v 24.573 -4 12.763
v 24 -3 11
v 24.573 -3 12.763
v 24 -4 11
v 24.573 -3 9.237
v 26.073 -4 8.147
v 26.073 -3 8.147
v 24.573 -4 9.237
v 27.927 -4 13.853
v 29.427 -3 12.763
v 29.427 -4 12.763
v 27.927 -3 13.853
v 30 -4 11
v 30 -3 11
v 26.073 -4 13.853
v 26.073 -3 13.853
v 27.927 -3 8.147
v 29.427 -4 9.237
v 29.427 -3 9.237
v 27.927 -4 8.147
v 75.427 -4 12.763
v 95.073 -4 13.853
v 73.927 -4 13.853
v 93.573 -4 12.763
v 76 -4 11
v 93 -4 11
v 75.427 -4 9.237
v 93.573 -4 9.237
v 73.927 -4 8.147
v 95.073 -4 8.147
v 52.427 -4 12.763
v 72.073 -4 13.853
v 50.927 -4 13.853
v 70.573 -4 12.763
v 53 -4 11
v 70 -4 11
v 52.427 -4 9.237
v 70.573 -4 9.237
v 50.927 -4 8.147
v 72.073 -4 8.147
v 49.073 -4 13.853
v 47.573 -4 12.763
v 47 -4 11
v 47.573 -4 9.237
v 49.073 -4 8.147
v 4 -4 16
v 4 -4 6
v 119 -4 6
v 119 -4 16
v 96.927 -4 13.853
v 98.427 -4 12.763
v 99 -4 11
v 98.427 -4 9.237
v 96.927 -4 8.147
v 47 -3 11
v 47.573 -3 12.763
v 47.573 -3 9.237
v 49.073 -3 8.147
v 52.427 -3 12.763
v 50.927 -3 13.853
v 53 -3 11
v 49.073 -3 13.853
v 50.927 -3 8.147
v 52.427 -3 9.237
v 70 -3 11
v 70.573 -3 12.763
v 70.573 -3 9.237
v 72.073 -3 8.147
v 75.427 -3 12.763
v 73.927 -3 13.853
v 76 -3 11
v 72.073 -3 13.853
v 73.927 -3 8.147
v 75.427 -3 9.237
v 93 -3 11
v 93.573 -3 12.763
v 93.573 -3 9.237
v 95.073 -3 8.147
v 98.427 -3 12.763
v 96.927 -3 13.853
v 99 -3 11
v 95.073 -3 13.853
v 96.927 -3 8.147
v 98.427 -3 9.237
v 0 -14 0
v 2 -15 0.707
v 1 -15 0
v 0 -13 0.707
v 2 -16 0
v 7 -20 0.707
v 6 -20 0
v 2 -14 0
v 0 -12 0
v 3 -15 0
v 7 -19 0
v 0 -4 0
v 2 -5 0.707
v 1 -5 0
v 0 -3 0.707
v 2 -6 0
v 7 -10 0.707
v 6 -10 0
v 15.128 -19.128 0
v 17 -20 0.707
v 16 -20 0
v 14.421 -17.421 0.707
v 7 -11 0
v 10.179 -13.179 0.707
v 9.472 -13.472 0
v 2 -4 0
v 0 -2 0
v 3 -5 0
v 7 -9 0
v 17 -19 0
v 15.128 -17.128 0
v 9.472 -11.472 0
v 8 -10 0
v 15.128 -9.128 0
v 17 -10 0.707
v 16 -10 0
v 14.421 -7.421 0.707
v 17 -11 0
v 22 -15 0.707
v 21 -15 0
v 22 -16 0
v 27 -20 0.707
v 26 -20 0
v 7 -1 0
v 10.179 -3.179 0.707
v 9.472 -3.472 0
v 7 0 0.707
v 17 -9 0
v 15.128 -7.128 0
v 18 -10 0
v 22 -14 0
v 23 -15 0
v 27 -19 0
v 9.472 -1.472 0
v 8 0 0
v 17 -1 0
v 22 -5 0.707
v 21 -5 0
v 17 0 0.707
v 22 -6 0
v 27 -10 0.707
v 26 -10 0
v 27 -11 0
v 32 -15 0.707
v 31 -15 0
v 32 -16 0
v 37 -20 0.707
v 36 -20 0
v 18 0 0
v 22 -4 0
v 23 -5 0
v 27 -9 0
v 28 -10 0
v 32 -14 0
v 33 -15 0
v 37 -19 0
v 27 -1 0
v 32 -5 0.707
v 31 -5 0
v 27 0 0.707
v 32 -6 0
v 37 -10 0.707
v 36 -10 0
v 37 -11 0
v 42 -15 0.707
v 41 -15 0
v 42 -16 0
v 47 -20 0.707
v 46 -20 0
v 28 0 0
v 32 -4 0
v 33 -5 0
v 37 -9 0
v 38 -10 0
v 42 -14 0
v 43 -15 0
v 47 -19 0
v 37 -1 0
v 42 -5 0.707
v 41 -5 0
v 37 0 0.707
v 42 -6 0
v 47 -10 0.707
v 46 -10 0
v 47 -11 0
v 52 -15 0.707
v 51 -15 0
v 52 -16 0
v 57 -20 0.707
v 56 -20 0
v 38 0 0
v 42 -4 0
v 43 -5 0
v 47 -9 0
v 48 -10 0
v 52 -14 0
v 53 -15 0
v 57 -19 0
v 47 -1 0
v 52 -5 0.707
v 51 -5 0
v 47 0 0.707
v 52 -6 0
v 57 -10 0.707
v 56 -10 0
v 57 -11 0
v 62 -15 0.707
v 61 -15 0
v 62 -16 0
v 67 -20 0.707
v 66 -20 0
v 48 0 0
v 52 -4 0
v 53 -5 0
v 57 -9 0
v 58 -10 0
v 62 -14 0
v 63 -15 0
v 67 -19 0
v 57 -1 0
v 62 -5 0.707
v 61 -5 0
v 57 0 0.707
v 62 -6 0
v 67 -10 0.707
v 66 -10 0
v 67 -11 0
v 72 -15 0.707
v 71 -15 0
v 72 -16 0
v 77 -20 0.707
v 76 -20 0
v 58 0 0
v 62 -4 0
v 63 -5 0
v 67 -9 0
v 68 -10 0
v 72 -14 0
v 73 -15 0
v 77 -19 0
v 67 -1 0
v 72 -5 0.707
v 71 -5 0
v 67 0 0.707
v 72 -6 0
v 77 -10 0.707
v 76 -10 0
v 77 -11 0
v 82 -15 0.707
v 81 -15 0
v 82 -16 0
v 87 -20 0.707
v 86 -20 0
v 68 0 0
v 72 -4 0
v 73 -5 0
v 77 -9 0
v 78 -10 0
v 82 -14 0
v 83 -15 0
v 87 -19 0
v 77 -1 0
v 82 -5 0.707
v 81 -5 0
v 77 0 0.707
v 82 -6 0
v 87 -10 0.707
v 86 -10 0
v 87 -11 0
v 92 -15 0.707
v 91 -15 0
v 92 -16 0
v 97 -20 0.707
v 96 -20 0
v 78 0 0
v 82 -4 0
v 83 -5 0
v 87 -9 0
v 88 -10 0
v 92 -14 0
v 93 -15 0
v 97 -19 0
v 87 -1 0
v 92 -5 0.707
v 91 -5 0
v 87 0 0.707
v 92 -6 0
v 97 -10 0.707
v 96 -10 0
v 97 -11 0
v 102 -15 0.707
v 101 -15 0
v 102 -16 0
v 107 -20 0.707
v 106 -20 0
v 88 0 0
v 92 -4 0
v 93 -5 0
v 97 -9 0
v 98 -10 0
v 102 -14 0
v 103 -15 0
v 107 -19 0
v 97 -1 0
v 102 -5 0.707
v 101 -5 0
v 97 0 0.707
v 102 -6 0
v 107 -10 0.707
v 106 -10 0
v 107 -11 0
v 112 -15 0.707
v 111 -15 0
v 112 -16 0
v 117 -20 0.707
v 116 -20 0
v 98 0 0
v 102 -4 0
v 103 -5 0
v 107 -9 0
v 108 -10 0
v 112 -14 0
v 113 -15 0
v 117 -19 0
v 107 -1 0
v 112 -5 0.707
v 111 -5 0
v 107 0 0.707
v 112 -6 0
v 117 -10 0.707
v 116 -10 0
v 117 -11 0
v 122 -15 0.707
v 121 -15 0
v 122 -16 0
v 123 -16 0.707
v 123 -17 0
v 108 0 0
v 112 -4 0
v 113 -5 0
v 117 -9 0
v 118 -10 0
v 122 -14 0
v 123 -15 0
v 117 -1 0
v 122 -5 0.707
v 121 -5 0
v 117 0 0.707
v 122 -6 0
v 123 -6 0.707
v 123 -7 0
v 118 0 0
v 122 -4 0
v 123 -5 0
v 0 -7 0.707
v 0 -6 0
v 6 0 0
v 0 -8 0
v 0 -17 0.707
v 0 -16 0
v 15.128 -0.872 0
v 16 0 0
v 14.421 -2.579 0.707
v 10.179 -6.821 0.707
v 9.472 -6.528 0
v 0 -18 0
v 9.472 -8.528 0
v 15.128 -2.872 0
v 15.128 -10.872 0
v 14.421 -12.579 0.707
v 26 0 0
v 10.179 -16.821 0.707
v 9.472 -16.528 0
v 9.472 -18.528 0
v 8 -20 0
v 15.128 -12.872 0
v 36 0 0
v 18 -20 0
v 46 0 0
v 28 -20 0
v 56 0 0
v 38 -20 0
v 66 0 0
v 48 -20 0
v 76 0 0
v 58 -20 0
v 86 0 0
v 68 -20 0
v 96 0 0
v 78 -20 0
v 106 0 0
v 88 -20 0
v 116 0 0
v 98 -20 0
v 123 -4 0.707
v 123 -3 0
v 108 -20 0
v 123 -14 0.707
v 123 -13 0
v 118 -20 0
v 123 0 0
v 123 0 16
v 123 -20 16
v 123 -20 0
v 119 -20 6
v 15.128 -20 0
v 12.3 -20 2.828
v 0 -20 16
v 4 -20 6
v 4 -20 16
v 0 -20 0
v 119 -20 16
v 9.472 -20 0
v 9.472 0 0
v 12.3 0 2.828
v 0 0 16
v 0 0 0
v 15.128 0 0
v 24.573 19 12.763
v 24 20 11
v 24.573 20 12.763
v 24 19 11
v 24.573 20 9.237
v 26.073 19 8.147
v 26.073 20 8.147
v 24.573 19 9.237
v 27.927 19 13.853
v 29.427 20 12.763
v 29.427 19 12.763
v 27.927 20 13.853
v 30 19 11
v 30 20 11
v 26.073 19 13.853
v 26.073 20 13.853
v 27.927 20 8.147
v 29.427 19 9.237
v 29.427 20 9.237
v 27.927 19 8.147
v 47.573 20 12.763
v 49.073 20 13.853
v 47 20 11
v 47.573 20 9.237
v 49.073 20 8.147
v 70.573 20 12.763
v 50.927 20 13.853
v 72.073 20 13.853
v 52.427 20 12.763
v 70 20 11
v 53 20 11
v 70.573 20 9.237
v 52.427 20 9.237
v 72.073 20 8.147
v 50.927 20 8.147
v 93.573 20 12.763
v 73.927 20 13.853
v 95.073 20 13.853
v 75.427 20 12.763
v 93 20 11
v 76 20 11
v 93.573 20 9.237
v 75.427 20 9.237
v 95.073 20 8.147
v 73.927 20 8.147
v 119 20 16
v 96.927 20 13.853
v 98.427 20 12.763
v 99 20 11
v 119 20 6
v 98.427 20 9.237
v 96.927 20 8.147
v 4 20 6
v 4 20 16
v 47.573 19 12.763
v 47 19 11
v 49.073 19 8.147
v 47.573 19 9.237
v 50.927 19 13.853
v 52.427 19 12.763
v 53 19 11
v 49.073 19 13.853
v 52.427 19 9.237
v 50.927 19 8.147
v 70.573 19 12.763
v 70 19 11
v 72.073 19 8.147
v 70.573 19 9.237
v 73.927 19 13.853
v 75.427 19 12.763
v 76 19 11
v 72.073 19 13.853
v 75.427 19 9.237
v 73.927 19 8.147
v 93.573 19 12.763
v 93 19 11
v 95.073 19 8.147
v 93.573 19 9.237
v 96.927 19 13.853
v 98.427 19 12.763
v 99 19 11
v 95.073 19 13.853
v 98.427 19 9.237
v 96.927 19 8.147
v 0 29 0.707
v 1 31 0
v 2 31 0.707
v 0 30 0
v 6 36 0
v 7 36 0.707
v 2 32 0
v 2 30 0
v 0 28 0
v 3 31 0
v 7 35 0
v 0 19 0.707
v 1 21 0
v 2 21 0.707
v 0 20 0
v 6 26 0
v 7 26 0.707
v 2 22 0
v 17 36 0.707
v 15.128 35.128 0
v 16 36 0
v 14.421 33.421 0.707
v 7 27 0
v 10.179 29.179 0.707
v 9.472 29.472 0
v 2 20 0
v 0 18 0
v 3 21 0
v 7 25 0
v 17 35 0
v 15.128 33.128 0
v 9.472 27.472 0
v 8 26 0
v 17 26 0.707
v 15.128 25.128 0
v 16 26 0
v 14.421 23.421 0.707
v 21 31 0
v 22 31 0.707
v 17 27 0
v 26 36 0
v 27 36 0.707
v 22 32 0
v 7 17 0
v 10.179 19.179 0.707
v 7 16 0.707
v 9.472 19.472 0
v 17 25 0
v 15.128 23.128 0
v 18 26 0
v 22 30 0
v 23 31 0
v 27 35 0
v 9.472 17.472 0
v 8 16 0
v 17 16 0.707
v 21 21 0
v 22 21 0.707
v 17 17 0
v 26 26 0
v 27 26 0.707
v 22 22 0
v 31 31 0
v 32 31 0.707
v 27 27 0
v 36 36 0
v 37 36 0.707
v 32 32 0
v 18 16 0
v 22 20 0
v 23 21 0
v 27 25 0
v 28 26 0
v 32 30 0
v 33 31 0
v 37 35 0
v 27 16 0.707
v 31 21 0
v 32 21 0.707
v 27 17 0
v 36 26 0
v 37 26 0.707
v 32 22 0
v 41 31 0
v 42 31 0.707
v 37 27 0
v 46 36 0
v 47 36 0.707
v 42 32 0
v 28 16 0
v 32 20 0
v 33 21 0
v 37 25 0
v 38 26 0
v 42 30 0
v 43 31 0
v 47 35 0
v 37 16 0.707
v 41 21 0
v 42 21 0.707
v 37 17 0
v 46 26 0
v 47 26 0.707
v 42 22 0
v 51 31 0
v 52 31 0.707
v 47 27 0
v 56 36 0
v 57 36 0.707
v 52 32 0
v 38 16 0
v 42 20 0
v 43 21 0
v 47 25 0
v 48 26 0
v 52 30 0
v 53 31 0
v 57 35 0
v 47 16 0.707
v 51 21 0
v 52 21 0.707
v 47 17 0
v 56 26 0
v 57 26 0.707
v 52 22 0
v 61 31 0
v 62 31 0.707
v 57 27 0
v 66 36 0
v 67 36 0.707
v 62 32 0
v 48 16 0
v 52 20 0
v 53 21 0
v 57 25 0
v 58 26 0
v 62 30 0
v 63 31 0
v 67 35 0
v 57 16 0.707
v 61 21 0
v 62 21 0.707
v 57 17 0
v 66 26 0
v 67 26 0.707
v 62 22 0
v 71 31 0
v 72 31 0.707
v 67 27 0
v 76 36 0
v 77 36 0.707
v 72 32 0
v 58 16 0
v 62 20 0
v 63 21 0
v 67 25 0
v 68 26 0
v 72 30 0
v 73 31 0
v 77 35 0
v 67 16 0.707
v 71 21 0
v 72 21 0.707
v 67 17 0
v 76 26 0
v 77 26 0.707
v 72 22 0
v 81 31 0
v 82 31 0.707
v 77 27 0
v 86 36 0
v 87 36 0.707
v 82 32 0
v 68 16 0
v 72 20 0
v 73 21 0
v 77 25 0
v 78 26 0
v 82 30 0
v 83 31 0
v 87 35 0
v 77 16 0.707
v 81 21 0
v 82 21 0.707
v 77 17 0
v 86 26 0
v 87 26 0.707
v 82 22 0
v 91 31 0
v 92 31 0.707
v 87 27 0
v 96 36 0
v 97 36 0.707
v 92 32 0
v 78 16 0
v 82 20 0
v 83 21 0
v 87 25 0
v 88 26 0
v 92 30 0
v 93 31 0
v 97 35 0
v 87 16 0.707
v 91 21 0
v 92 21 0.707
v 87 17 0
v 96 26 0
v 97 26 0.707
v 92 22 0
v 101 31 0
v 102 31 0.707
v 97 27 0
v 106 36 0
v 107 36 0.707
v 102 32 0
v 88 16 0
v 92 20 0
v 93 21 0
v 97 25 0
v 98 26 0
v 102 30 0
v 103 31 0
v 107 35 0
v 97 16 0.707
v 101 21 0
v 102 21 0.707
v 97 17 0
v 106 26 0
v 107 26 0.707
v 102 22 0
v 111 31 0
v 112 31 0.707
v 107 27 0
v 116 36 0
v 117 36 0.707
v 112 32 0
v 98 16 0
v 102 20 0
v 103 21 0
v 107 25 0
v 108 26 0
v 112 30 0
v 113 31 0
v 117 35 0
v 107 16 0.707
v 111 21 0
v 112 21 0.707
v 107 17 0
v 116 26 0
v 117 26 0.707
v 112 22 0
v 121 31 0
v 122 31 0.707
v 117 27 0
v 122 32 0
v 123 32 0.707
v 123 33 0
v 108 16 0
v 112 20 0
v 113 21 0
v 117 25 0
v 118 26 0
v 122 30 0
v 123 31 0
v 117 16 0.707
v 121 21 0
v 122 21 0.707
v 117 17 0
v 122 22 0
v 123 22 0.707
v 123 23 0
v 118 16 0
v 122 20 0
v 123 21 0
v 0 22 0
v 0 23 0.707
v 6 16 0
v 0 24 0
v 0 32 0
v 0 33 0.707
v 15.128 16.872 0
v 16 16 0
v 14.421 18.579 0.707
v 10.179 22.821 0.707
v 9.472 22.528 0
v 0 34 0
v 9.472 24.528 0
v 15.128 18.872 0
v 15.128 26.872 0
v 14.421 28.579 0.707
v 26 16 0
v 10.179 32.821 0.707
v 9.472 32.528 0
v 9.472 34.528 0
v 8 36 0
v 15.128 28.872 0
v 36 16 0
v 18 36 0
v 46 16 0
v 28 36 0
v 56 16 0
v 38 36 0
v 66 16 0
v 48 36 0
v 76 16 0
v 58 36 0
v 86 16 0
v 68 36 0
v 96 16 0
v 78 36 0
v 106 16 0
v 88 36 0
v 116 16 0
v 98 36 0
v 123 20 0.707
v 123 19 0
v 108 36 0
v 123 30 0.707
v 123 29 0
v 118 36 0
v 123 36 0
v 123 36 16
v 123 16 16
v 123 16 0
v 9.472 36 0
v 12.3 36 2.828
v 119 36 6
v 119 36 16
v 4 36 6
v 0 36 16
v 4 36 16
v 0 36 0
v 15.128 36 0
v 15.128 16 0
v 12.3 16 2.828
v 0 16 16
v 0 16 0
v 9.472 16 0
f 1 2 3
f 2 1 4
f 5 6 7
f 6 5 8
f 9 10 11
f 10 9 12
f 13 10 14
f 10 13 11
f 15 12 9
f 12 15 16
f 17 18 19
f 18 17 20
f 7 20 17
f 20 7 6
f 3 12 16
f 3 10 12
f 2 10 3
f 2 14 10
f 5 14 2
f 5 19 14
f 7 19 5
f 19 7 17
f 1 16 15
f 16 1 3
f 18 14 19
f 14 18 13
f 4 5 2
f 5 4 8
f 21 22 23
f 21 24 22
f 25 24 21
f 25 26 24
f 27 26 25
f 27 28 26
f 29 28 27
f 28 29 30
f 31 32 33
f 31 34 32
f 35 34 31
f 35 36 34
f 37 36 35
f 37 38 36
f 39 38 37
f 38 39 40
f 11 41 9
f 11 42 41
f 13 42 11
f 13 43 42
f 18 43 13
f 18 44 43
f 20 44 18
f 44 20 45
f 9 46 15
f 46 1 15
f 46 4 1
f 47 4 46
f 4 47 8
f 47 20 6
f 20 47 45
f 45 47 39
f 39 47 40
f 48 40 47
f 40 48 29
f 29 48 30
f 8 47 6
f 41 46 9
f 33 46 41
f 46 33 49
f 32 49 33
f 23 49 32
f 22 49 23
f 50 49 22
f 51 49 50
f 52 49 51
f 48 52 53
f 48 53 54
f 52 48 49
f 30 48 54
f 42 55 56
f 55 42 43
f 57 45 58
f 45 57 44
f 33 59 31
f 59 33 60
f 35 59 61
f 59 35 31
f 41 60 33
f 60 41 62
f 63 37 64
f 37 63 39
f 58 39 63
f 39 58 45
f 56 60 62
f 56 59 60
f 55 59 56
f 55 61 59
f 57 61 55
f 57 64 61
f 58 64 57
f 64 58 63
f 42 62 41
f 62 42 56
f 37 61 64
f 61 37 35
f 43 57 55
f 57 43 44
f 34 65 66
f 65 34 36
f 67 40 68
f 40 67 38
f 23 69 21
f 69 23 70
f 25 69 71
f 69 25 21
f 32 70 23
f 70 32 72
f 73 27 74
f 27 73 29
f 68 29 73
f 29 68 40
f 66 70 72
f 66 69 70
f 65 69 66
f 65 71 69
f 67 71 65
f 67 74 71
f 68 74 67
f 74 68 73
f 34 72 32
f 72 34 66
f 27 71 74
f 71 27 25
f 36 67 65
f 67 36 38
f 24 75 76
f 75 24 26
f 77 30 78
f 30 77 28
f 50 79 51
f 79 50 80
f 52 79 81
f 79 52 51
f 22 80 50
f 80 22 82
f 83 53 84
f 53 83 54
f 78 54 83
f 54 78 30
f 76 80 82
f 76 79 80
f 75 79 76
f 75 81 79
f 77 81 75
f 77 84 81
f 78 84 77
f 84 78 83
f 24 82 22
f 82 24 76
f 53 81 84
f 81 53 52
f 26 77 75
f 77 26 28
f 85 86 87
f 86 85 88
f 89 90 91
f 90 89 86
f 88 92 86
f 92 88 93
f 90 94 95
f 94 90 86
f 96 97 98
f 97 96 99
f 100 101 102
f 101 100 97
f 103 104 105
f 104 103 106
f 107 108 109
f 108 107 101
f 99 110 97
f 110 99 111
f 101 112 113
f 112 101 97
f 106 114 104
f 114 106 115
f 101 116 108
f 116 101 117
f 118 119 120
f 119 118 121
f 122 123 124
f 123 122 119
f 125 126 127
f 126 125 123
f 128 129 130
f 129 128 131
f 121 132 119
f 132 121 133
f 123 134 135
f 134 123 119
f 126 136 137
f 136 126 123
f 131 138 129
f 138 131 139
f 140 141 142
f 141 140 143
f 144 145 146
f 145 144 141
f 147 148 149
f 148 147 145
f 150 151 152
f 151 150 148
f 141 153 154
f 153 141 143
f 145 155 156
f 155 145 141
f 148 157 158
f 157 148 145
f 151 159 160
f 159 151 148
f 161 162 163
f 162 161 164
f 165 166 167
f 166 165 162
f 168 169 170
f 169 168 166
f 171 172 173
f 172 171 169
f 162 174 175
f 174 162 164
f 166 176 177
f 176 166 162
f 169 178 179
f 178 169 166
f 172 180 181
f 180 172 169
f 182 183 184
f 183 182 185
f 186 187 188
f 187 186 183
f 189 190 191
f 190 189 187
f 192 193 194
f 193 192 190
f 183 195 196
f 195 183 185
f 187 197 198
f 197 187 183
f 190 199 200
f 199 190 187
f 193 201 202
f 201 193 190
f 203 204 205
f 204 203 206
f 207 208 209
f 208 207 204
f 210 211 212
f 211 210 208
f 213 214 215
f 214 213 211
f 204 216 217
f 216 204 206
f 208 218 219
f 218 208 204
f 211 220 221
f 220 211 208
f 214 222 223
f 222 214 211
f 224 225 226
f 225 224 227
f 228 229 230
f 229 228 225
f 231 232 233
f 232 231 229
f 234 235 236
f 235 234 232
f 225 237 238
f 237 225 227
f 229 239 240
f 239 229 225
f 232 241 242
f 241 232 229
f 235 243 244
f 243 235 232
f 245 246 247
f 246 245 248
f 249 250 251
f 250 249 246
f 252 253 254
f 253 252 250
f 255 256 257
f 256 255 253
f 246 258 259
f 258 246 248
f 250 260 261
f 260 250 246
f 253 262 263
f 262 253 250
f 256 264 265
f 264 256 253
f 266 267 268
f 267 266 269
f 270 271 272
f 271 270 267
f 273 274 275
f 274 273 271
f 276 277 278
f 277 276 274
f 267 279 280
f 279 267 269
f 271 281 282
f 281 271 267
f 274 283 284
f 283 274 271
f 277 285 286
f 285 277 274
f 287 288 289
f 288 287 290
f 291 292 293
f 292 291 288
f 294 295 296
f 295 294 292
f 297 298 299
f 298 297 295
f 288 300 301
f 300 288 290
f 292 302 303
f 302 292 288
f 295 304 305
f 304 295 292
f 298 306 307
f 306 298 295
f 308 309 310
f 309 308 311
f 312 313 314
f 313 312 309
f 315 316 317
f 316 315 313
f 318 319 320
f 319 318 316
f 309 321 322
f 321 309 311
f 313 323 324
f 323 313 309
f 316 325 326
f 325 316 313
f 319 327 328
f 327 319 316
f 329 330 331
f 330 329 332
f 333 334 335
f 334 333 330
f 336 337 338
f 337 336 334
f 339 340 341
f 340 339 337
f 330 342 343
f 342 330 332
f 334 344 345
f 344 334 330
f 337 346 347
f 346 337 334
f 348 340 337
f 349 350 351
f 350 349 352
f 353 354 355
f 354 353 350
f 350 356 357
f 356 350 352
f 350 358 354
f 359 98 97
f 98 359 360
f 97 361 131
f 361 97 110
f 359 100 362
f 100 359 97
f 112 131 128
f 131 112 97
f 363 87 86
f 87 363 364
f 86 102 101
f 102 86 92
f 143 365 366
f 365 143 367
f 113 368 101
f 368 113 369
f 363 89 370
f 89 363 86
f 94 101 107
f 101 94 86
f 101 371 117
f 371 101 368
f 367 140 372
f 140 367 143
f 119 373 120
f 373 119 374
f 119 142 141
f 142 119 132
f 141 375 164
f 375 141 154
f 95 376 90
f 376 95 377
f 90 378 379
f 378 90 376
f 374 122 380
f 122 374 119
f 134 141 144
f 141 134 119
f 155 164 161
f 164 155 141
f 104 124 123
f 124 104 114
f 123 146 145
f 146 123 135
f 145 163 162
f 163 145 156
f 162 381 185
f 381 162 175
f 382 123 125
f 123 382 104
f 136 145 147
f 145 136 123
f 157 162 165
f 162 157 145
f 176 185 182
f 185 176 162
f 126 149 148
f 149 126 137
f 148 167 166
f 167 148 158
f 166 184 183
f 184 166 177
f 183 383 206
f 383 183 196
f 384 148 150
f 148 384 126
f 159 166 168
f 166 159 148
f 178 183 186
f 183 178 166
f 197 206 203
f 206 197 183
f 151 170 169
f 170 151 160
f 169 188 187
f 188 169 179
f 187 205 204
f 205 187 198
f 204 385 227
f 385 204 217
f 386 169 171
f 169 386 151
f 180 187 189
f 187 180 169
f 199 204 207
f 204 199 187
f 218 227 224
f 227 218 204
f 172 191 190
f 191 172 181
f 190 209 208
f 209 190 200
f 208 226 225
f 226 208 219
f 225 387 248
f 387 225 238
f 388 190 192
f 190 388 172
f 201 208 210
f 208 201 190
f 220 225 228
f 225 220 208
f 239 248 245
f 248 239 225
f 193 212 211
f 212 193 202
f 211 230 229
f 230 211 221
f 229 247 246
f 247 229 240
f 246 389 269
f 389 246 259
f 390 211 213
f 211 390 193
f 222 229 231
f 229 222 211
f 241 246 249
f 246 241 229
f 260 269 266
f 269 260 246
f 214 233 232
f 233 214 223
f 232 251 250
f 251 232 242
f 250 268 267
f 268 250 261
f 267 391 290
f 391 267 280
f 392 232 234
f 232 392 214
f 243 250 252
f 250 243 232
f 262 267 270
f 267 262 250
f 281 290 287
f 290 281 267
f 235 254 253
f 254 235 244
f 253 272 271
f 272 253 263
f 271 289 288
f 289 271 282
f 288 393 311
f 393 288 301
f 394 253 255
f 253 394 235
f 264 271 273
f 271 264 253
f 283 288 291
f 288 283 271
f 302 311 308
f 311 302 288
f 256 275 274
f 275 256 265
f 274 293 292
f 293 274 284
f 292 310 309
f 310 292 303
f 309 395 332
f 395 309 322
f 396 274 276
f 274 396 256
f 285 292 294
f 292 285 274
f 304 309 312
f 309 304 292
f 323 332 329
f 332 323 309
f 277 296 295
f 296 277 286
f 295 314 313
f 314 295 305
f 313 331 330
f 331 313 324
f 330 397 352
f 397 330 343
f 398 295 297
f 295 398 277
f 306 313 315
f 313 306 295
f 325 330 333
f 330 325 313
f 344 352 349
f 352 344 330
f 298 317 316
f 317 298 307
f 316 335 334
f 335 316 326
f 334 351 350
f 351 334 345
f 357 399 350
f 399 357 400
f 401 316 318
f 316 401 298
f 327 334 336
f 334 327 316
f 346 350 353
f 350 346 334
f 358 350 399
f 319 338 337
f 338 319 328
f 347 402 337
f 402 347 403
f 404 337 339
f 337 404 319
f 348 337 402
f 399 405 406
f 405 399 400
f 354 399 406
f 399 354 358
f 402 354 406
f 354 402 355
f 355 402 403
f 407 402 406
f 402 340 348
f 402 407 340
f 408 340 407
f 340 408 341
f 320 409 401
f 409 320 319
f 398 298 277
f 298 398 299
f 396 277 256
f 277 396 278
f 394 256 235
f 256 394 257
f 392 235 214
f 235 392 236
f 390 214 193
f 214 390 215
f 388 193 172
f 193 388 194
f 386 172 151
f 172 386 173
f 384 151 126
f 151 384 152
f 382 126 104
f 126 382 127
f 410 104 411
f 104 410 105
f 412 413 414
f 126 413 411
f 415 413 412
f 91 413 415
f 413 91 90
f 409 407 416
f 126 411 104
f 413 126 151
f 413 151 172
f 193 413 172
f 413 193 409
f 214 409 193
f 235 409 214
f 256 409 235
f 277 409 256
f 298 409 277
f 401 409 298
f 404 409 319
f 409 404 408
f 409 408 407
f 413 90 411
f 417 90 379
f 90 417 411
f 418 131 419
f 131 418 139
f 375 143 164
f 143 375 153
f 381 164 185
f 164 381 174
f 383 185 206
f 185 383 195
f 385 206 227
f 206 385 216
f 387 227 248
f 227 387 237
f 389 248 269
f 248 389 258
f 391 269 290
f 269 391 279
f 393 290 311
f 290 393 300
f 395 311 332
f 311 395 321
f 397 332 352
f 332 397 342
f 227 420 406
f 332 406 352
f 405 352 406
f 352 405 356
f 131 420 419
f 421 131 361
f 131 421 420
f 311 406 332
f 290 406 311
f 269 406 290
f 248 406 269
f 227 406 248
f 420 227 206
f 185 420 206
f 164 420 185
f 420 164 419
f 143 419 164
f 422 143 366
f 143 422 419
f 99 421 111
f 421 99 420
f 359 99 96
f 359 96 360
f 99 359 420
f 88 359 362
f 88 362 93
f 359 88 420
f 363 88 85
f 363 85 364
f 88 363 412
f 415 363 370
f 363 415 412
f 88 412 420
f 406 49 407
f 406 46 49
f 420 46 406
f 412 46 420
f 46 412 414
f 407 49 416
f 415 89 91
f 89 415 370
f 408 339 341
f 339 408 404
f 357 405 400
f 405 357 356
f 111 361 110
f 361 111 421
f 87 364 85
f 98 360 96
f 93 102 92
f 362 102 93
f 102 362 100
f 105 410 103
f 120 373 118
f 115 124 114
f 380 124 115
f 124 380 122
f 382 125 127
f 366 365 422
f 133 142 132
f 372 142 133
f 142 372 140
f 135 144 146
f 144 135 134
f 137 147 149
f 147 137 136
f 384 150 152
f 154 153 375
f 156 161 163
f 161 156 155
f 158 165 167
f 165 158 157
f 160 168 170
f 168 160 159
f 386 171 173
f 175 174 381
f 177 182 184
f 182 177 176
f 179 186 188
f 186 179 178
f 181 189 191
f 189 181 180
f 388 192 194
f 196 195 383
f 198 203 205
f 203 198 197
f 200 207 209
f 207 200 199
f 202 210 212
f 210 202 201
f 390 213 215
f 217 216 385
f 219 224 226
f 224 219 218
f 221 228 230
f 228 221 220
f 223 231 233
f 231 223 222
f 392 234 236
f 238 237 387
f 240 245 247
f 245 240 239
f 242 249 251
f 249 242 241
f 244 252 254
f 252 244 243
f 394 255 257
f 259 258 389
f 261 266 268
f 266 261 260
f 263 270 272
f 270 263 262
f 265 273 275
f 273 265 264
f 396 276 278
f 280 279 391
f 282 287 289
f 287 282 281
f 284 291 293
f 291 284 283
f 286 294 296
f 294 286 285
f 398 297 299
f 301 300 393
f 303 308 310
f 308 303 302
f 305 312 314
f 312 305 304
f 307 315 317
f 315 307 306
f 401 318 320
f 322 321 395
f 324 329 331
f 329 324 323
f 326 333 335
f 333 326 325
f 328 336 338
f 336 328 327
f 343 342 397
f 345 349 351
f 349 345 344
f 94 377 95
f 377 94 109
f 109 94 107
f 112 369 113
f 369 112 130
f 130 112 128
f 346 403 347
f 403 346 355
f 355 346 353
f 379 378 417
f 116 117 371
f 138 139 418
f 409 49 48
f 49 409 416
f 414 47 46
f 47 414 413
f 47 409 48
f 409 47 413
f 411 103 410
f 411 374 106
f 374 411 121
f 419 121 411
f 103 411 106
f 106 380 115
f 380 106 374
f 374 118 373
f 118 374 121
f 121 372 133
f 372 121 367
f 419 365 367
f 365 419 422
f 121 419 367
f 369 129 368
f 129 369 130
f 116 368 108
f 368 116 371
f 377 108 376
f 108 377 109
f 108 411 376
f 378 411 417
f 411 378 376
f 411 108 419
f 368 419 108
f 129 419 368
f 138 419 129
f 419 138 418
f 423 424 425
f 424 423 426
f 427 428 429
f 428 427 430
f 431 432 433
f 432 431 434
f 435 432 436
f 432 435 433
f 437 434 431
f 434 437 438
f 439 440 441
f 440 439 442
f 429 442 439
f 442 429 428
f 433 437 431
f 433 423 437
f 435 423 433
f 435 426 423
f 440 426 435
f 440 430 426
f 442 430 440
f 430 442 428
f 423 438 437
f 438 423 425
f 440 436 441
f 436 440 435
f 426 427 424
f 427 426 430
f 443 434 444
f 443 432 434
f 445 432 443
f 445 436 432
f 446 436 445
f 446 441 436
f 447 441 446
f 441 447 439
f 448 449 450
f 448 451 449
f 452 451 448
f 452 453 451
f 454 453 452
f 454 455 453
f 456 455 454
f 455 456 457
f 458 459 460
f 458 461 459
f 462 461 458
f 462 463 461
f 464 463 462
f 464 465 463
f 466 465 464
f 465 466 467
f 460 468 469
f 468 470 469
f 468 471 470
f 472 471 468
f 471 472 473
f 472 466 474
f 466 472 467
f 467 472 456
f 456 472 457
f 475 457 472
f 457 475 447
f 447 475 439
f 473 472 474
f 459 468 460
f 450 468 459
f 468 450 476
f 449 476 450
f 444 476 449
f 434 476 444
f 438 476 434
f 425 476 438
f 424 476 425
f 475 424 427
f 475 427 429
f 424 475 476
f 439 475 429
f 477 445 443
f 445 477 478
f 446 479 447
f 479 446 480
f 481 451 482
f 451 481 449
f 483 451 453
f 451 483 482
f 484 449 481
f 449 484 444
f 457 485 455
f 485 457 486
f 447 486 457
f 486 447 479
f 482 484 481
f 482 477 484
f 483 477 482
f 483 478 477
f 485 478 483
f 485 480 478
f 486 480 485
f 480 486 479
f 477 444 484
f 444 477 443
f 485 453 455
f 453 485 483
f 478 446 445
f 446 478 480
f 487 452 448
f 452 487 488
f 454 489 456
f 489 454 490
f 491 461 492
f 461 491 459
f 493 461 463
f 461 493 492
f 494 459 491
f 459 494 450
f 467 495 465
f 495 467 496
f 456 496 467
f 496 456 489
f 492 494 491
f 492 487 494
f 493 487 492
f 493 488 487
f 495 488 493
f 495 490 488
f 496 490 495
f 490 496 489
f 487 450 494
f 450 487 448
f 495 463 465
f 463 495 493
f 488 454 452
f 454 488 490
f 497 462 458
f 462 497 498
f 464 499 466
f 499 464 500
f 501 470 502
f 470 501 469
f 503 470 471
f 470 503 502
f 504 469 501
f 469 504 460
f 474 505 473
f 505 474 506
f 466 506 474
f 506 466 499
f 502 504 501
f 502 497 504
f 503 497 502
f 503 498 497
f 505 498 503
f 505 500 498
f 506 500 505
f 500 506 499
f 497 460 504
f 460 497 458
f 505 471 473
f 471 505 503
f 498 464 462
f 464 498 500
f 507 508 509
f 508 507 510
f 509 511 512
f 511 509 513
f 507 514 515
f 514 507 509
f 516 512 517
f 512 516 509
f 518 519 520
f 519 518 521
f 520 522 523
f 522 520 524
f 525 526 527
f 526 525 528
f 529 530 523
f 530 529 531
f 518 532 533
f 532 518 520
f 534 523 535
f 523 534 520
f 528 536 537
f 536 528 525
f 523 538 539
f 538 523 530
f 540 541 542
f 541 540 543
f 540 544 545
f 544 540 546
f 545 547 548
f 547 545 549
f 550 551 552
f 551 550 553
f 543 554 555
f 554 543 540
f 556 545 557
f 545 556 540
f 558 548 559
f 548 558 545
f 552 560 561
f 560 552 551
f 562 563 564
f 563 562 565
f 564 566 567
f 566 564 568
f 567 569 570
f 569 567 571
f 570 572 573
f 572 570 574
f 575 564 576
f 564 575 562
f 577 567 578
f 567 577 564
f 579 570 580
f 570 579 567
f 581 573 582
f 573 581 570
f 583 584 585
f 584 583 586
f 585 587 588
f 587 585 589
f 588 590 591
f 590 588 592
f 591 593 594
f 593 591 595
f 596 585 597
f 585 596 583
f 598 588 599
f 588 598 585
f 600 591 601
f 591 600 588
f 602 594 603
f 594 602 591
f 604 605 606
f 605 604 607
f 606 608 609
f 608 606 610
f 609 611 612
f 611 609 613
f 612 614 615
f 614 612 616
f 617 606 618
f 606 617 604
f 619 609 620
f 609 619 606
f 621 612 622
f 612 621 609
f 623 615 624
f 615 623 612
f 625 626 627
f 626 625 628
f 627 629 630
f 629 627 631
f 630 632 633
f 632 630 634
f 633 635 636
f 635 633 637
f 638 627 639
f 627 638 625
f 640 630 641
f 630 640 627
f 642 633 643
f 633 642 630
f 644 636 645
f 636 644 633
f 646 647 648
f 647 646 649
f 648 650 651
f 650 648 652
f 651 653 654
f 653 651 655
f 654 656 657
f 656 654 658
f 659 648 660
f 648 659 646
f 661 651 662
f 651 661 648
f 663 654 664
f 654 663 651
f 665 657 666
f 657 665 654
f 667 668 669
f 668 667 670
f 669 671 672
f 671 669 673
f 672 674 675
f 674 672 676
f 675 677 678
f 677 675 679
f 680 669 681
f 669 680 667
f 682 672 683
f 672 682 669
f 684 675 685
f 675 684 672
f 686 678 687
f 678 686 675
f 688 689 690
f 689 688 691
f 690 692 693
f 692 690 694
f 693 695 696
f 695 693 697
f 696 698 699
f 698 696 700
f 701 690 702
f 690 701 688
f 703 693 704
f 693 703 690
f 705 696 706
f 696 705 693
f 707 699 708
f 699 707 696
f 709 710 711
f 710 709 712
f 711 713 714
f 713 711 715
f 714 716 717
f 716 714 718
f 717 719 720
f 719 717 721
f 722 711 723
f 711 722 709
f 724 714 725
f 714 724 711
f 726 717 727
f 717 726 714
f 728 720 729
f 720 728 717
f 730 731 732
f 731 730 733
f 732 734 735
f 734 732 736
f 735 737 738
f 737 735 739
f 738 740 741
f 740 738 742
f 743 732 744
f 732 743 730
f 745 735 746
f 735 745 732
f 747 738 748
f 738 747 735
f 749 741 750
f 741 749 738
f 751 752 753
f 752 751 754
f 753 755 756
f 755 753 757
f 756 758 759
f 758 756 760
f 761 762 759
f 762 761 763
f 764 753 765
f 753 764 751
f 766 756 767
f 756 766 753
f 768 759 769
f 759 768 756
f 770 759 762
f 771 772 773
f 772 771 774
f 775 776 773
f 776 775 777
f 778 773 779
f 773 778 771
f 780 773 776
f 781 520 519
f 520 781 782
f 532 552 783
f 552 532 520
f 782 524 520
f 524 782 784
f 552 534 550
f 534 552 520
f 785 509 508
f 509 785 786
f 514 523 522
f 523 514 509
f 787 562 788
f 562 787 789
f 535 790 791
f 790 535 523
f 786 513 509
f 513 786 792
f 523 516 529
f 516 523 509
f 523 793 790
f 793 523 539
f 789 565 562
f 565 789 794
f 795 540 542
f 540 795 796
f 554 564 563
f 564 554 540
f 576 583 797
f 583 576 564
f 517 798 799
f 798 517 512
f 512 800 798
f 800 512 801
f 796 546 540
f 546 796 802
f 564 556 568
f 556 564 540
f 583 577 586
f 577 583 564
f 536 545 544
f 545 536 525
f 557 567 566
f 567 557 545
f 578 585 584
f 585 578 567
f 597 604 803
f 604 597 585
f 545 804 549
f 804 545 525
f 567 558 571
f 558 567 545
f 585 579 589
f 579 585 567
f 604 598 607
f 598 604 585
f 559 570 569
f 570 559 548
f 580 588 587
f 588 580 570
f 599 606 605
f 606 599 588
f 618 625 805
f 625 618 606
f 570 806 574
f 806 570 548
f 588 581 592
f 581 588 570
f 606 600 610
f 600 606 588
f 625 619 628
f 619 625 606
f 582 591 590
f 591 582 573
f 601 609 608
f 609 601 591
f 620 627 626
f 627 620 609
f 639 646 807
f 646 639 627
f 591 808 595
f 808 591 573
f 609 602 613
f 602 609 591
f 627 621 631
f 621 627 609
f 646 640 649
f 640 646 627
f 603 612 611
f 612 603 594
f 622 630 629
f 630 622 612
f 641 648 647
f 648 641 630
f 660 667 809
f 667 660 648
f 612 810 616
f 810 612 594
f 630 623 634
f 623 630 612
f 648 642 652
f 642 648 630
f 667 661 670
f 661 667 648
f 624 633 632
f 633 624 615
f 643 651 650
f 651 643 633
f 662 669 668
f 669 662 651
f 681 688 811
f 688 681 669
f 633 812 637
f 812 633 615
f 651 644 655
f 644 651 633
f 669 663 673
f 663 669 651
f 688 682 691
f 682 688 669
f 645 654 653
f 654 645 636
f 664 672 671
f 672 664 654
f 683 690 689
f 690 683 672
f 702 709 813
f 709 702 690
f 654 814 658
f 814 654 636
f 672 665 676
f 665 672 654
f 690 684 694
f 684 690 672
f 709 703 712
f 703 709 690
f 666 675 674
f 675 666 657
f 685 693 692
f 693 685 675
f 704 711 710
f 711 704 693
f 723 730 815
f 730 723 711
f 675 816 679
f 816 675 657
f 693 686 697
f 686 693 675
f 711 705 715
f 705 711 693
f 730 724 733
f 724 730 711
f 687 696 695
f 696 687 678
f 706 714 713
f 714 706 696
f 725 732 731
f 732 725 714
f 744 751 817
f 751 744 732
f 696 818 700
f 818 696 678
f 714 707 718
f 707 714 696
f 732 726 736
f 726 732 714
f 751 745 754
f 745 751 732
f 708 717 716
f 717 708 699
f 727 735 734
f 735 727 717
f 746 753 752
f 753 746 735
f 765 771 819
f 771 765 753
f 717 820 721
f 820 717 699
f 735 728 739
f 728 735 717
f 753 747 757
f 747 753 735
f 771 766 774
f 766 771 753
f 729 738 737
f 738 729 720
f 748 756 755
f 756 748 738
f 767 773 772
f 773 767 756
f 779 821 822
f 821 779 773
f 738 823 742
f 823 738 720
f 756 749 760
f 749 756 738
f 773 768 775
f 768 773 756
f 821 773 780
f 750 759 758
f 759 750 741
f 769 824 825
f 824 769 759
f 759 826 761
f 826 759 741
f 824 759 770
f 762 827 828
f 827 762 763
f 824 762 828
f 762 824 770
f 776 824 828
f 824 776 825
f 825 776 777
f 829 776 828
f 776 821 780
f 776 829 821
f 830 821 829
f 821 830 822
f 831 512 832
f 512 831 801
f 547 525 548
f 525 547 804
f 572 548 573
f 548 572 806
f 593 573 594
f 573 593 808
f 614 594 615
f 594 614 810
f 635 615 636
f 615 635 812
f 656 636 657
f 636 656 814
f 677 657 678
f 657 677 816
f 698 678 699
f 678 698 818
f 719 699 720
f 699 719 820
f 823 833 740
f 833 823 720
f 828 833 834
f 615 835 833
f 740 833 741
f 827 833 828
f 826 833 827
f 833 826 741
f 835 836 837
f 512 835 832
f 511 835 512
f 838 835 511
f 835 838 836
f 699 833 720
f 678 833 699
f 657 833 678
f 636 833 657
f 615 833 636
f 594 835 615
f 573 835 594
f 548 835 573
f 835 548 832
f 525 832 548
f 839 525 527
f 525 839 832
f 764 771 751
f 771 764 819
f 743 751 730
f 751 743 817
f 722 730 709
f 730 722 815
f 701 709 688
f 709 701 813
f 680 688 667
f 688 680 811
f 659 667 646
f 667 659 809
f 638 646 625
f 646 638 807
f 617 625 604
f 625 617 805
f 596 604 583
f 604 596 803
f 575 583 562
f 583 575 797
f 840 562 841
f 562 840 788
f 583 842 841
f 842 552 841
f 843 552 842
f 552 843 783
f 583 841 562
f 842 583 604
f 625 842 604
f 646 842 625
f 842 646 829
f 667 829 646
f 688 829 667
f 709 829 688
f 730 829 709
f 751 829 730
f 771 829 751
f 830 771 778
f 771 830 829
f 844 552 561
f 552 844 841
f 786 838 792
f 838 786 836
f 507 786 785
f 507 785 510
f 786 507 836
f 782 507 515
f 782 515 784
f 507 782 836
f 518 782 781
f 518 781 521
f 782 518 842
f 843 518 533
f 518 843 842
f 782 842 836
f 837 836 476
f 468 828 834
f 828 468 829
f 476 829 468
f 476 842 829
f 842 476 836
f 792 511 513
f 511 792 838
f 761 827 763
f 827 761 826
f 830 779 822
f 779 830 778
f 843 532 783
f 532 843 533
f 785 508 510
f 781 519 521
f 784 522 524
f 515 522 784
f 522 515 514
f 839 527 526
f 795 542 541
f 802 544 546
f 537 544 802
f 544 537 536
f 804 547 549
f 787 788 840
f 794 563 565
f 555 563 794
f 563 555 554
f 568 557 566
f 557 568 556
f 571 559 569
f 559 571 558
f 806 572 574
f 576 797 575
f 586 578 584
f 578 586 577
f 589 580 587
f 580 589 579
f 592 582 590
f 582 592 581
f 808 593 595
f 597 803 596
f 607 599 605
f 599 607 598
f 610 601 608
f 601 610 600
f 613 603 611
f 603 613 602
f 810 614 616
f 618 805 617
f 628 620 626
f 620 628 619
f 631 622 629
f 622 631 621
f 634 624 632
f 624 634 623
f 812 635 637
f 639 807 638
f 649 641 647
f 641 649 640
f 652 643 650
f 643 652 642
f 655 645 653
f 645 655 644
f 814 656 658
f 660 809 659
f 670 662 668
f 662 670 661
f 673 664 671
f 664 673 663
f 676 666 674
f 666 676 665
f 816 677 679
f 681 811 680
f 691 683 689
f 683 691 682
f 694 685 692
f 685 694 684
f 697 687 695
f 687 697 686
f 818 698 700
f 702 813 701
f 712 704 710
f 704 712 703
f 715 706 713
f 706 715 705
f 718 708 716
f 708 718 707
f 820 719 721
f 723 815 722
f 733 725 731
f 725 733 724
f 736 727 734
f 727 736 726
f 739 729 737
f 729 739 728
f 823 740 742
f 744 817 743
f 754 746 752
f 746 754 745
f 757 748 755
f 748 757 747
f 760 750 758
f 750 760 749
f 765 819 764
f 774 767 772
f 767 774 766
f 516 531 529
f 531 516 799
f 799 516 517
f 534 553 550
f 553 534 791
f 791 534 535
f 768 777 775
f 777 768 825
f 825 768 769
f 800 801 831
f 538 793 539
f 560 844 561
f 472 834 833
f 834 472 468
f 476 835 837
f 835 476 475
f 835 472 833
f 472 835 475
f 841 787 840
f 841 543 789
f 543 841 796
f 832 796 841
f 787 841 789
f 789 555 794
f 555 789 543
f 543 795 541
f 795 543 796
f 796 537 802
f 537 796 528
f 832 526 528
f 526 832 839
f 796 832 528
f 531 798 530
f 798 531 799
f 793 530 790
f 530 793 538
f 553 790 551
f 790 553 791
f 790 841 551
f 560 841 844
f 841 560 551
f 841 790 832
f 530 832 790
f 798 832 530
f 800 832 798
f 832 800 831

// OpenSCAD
// The *interior* length of the jaw covers in mm.  This should be the size of your vise.  The walls will be added to this size.
interiorLength = 115;

// The width of the jaw covers as measured from the front of the face - this goes over the top of the vise and includes the jaw thickness.
totalWidth = 16;

// The height of the jaws as measured from the bottom of the jaw to the top
totalHeight = 20;

// The thickness of the gripping portion of the jaws.  Subtracted from the total width to determine how much goes over the top of the vise
jawThickness = 6;

// The thickness of all other walls aside from the jaws
wallThickness = 4;

// Number of magnets to put in the top of the jaws.  These will be equalled distributed across the length
numberOfMagnets = 4;

// Size of the magnets in mm.  If the magnets are square this will be the sides of the cube, otherwise this will be the diameter of the circle
magnetSize = 6;

// Height of the magnets in mm.  Make sure that your wall thickness is greater than this value
magnetDepth = 1;

// Set to 1 for square magnets or 0 for round magnets
squareMagnets = 0;

// Jaw face spacing between grip lines
gripSpacing = 10;

// Angle of the grip lines.  Values over 75 don't work so well.
gripAngle = 45;

// Number of round stock holder grooves.  If this is set to one, then the round stock holder position below is where it'll be placed.   
roundStockHolderCount = 1;

// Round stock holder groove.  Make sure the jaw thickness is enough that this won't go through the face
roundStockHolderGrooveSize = 4;

// Position of the stock holder groove as a percentage of the face - 0 to 100.  Keep in mind that 0 and 100 are going to be off the ends.  I recommend 10 and 90 as end stops but I'm not going to stand in your way.  If you specify multiple round stock holders the first will be placed here and all others will be placed based on this one.
roundStockHolderPosition = 10;

// Whether or not the round stock holder is horizontal or vertical.  Set to 0 for vertical and 1 for horizontal
roundStockHolderHorizontal = 0;

// Scaling value for the round stock holder.  Use this to make it wider without making it deeper - i.e. change the angle of the holder.  At 1 it creates a 45 degree angle. Values less than one make smaller angles and values greater than one make larger angles.  Setting this to zero effectively removes the round stock holder
roundStockHolderWidthScale = 1;

// How far apart to place the round stock holders.  This only takes effect if you have multiple round stock holders.  The first one will be placed at the initial position and all others will be placed this far away from it.  This distance should be greater than the round stock holder groove size * the round stock holder width scale.  If not, they're going to overlap.
gapBetweenRoundStockHolders = 30;

// The angle to face the jaws.  Set to 90 to face them down, 0 to face out, 180 to face in, 270 to face up, or 45 if you're feeling particularly adventurous
printingAngle = 90;

// Whether or not to print two jaws.  Set to 1 to get two jaws and 0 (or anything else really) to get a single jaw
printTwoJaws = 1;

// Create the first jaw
rotate ([printingAngle,0,0])
{
    CreateJaw();
}

// Create the second jaw if requested
if (printTwoJaws == 1)
{
    // The translation amount depends heavily on the angle.  Without this they end up
    // a long way apart or overlapping
    if (printingAngle < 45)
    {
        CreateSecondJaw(-3);
    }
    else if (printingAngle < 90)
    {
        CreateSecondJaw(-2);
    }
    else if (printingAngle < 200)
    {
        CreateSecondJaw(-1);
    }
    else
    {
        CreateSecondJaw(1);
    }
}

module CreateSecondJaw(translationSize)
{
    mirror([0,1,0])
    {
        // Move over a little and create a second jaw
        translate([0,totalWidth * translationSize,0])
        {
            rotate ([printingAngle,0,0])
            {
                CreateJaw();
            }
        }
    }
}

module CreateJaw()
{
    difference()
    {
        // The full jaw size
        cube([AddWalls(interiorLength, 2), totalWidth, totalHeight], false);

        // Subtract the "interior" of the jaws
        translate([wallThickness, jawThickness, wallThickness])
        {
            cube([interiorLength, SubtractJawWidth(totalWidth), AddWalls(totalHeight, -1)], false);
        }
        
        if (numberOfMagnets > 0)
        {
            // Subtract holes for the magnets
            translate([wallThickness, AddJawWidth(totalWidth)/2, wallThickness - magnetDepth])
            {
                CreateMagnetHoles(numberOfMagnets, interiorLength, magnetSize, magnetDepth, squareMagnets);
            }
        }
        
        // Subtract lines for the face "grip" pattern
        CreateGrip(gripSpacing, AddWalls(interiorLength, 2), totalHeight, gripAngle);

        for(moveCount = [1:roundStockHolderCount])
        {
            roundStockHolderCurrentOffset = gapBetweenRoundStockHolders * (moveCount - 1);
            // Create round stock groove
            if (roundStockHolderHorizontal == 0)
            {
                translate([(AddWalls(interiorLength, 2) * (roundStockHolderPosition / 100)) + roundStockHolderCurrentOffset, 0, 0])
                {
                    CreateRoundStockHolderGroove(roundStockHolderGrooveSize, roundStockHolderHorizontal, totalHeight);
                }
            }
            else
            {
                translate([0, 0, (totalHeight * (roundStockHolderPosition / 100)) + roundStockHolderCurrentOffset])
                {
                    rotate([0,90,0])
                    {
                        CreateRoundStockHolderGroove(roundStockHolderGrooveSize, roundStockHolderHorizontal, AddWalls(interiorLength, 2));
                    }
                }
            }
            
        }
    }
}

function AddWalls(length, numberWalls) = length + (wallThickness * numberWalls);

function AddJawWidth(length) = length + jawThickness;

function SubtractJawWidth(length) = length - jawThickness;

module CreateMagnetHoles(magnetCount, length, size, depth, magnetType)
{
    movementSize = length / (magnetCount + 1);
    for(moveCount = [1:magnetCount])
    {
        // Cubes are created at the corner of the existing location where
        // cylinders are not.  So for magnet type 1 (cube) we need to move 
        // by half the magnet size to get back to the right spot.  For round
        // magnets we multiply by the magnet type (0) and the translation vanishes
        // We can center the cube but then it's off vertically since it centers in all 
        // dimensions
        translate([moveCount * movementSize, -magnetType * (size/2), 0])
        {
            if (magnetType == 0)
            {
                cylinder(depth, d=size, center=false);
            }
            else
            {
                cube([size, size, depth], false);
            }
        }
    }
}

module CreateGrip(spacing, length, height, angle)
{
    // Since this is a random angle given by the user and I don't feel like working 
    // out the angles to get the precise length for each I'm just going for a big 
    // distance.  4x the length works great up until about 80 degrees at which point other things
    // start falling apart and I suddenly start caring less.
    extendedLength = length * 4;
    horizontalMovementCount = extendedLength / spacing;
    
    // First pass at the given angle
    CreateGripLines(angle, horizontalMovementCount, spacing, height, length, extendedLength);
    // Second pass at the opposite of that angle
    CreateGripLines(-angle, horizontalMovementCount, spacing, height, length, extendedLength);
}

module CreateGripLines(angle, movementCount, spacing, height, extendedLength)
{
    // If we're going to do an angle movement we have to 
    // back off a bit so that the angles intersect the main cube
    translate([-extendedLength, 0, 0])
    {
        for(moveCount = [1:movementCount])
        {
            translate([moveCount * spacing, 0, 0])
            {
                // Rotate to the grip angle that the user specified
                rotate ([0, angle, 0])
                {
                    // Turn so that the grip is nicely beveled and easier to print
                    // than square edges.  We're rotating separately here because if you 
                    // put both values in the same rotation it rotates first one way
                    // then the other and you really don't end up where you wanted to be
                    rotate([0, 0, 45])
                    {
                        cube([1, 1, height * 5], true);
                    }
                }
            }
        }
    }
}

module CreateRoundStockHolderGroove(size, horizontal, length)
{
    // Rotate so that we get a V groove that round stock fits in nicely
    scale([roundStockHolderWidthScale * 1, 1, 1])
    {
        rotate([0, 0, 45])
        {
            // Long length to make sure that we don't miss any edges
            cube([size, size, length * 2], true);
        }
    }
}
